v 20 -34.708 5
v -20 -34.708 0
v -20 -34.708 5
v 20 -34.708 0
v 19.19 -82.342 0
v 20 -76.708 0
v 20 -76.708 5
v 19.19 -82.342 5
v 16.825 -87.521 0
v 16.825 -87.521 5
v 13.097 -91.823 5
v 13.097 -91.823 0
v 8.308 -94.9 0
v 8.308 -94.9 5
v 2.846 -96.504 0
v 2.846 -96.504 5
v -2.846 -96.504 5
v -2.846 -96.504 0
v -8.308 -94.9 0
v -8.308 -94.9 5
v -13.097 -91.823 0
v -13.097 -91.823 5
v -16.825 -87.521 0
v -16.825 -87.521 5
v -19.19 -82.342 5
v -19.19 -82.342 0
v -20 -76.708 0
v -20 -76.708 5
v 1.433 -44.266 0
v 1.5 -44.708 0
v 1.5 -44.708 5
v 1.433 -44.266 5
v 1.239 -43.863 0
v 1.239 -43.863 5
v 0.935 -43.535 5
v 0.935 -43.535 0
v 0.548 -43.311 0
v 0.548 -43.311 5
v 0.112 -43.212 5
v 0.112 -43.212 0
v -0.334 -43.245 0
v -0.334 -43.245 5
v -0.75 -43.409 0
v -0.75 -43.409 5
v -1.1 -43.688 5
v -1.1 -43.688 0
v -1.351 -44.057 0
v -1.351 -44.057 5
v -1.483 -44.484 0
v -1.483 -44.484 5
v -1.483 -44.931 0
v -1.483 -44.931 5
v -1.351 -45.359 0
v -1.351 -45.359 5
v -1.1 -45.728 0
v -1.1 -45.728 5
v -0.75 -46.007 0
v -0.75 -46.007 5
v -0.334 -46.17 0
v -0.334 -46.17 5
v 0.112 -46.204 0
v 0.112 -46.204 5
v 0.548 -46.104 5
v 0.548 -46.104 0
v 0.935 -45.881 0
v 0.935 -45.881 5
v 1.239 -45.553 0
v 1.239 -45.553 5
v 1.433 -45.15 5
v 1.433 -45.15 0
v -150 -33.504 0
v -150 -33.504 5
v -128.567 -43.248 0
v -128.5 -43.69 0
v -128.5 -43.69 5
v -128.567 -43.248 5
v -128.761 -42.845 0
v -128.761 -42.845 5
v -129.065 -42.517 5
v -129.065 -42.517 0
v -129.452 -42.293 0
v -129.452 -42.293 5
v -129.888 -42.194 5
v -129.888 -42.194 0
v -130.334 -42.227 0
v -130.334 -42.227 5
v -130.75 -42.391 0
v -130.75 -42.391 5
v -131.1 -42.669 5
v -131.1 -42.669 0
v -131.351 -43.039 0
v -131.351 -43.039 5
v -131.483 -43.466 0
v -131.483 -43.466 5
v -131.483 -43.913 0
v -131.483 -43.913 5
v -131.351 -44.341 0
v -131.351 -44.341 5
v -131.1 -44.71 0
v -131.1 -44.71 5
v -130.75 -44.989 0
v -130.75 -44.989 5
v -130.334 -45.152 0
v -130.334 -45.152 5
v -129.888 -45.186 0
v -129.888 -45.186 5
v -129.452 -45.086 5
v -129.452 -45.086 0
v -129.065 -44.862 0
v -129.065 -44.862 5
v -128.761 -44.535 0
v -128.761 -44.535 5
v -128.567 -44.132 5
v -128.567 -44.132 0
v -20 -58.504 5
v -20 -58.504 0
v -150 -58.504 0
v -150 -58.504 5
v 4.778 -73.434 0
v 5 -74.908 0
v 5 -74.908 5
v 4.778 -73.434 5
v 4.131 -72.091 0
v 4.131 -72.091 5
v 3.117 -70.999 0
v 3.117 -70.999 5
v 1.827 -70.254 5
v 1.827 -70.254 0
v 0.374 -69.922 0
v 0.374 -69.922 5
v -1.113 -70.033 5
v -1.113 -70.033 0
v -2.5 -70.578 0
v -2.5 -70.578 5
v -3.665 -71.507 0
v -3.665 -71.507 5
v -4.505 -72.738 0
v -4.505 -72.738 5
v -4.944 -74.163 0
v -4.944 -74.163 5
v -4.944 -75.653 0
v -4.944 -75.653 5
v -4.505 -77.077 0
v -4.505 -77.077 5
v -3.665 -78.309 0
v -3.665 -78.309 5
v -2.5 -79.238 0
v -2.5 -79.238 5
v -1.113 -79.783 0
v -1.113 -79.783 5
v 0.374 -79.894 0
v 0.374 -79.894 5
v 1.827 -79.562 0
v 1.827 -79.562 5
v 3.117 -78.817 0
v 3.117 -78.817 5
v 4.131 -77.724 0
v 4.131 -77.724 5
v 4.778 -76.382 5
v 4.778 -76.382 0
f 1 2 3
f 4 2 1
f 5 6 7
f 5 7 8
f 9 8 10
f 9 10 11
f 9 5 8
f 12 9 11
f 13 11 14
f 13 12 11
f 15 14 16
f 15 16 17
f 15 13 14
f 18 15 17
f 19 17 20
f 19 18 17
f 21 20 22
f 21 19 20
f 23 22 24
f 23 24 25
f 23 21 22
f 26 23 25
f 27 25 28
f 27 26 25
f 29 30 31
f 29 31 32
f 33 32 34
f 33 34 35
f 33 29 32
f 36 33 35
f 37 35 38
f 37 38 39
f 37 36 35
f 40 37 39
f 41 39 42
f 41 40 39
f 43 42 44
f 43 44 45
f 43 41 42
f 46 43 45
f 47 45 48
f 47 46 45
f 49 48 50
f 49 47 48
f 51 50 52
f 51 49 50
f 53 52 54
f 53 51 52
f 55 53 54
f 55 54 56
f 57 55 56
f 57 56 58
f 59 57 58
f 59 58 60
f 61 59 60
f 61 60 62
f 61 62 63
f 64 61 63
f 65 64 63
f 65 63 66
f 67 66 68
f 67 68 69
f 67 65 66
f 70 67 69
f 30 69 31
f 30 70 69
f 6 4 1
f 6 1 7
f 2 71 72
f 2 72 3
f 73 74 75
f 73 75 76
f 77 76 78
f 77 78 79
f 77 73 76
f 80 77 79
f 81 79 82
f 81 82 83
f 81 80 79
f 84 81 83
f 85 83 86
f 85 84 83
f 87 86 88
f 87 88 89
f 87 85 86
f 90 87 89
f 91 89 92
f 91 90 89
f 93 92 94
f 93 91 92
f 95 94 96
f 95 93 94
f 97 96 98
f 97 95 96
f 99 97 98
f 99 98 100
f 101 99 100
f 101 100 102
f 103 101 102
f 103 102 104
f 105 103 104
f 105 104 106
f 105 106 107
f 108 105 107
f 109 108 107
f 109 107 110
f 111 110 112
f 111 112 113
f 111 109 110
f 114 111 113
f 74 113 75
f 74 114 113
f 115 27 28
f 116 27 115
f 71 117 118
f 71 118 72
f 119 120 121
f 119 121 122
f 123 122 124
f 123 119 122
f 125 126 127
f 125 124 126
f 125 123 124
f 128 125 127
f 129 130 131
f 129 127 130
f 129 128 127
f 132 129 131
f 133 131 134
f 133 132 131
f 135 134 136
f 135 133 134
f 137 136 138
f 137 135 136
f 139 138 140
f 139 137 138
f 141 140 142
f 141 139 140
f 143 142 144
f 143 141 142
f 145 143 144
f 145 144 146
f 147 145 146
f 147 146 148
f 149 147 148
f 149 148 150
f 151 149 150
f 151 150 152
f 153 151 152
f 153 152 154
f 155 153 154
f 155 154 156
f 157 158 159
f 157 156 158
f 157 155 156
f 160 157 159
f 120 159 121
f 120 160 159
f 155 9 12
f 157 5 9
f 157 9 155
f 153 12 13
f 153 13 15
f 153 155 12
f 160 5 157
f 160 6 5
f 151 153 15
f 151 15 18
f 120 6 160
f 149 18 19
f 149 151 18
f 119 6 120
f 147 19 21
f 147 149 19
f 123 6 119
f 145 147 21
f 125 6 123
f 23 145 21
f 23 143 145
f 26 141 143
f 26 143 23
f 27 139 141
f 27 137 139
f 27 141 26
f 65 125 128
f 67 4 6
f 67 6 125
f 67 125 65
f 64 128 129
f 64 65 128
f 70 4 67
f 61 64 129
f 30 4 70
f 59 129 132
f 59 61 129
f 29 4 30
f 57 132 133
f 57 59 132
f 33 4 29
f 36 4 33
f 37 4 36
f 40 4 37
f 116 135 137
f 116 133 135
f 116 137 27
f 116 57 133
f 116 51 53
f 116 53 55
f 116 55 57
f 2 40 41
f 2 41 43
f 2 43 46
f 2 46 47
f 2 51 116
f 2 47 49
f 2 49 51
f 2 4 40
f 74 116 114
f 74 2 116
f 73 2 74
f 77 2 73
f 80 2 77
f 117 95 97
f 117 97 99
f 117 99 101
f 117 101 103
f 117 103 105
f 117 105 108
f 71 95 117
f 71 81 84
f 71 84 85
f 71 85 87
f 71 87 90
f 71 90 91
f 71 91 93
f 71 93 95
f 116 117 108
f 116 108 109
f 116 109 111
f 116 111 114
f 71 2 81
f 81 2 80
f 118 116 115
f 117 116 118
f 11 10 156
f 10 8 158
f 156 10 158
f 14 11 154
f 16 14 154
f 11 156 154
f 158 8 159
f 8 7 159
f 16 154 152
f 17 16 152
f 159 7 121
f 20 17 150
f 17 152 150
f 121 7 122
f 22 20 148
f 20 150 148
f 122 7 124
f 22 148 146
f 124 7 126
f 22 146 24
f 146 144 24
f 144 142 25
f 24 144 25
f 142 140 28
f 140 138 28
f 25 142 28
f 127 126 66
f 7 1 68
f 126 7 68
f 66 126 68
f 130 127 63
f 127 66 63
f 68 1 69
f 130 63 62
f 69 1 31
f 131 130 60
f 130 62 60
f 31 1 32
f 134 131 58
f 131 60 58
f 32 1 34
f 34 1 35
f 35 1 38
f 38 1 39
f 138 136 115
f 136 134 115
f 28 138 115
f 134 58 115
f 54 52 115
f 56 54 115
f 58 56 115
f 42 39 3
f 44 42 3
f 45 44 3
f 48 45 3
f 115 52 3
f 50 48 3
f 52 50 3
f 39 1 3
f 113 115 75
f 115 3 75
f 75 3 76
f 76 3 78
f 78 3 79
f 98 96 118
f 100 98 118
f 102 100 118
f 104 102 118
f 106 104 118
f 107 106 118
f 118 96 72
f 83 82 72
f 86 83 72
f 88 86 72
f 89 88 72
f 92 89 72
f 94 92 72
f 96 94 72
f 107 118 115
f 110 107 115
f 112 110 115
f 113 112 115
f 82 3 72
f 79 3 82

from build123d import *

# Parameters (mm, degrees)
SKETCH1_R               = 1.5
BOSS_EXTRUDE1_DEPTH     = 5
CUT_EXTRUDE1_DEPTH      = 37
CUT_EXTRUDE1_DEPTH_BACK = 24
SKETCH2_R               = 5


with BuildPart() as part:
    # Sketch1 → Boss-Extrude1 (new body)
    with BuildSketch(Plane.XY):
        with BuildLine():
            Line((-20, -76.707766284), (-20, -58.504148974))
            Line((-20, -58.504148974), (-150, -58.504148974))
            Line((-150, -58.504148974), (-150, -33.504148974))
            Line((-150, -33.504148974), (-20, -34.707766284))
            Line((-20, -34.707766284), (20, -34.707766284))
            Line((20, -34.707766284), (20, -76.707766284))
            ThreePointArc((20, -76.707766284), (0, -96.707766284), (-20, -76.707766284))
        make_face()
        with Locations((0, -44.707766284)):
            Circle(SKETCH1_R, mode=Mode.SUBTRACT)
        with Locations((-130, -43.689749466)):
            Circle(SKETCH1_R, mode=Mode.SUBTRACT)
    extrude(amount=BOSS_EXTRUDE1_DEPTH)

    # Sketch2 → Cut-Extrude1 (cut, two sides: drawn at the far end of the back side and taken through both)
    with BuildSketch(Plane.XY.offset(5).offset(-CUT_EXTRUDE1_DEPTH_BACK)):
        with Locations((0, -74.90788056)):
            Circle(SKETCH2_R)
    extrude(amount=CUT_EXTRUDE1_DEPTH + CUT_EXTRUDE1_DEPTH_BACK, mode=Mode.SUBTRACT)


solid = part.part
